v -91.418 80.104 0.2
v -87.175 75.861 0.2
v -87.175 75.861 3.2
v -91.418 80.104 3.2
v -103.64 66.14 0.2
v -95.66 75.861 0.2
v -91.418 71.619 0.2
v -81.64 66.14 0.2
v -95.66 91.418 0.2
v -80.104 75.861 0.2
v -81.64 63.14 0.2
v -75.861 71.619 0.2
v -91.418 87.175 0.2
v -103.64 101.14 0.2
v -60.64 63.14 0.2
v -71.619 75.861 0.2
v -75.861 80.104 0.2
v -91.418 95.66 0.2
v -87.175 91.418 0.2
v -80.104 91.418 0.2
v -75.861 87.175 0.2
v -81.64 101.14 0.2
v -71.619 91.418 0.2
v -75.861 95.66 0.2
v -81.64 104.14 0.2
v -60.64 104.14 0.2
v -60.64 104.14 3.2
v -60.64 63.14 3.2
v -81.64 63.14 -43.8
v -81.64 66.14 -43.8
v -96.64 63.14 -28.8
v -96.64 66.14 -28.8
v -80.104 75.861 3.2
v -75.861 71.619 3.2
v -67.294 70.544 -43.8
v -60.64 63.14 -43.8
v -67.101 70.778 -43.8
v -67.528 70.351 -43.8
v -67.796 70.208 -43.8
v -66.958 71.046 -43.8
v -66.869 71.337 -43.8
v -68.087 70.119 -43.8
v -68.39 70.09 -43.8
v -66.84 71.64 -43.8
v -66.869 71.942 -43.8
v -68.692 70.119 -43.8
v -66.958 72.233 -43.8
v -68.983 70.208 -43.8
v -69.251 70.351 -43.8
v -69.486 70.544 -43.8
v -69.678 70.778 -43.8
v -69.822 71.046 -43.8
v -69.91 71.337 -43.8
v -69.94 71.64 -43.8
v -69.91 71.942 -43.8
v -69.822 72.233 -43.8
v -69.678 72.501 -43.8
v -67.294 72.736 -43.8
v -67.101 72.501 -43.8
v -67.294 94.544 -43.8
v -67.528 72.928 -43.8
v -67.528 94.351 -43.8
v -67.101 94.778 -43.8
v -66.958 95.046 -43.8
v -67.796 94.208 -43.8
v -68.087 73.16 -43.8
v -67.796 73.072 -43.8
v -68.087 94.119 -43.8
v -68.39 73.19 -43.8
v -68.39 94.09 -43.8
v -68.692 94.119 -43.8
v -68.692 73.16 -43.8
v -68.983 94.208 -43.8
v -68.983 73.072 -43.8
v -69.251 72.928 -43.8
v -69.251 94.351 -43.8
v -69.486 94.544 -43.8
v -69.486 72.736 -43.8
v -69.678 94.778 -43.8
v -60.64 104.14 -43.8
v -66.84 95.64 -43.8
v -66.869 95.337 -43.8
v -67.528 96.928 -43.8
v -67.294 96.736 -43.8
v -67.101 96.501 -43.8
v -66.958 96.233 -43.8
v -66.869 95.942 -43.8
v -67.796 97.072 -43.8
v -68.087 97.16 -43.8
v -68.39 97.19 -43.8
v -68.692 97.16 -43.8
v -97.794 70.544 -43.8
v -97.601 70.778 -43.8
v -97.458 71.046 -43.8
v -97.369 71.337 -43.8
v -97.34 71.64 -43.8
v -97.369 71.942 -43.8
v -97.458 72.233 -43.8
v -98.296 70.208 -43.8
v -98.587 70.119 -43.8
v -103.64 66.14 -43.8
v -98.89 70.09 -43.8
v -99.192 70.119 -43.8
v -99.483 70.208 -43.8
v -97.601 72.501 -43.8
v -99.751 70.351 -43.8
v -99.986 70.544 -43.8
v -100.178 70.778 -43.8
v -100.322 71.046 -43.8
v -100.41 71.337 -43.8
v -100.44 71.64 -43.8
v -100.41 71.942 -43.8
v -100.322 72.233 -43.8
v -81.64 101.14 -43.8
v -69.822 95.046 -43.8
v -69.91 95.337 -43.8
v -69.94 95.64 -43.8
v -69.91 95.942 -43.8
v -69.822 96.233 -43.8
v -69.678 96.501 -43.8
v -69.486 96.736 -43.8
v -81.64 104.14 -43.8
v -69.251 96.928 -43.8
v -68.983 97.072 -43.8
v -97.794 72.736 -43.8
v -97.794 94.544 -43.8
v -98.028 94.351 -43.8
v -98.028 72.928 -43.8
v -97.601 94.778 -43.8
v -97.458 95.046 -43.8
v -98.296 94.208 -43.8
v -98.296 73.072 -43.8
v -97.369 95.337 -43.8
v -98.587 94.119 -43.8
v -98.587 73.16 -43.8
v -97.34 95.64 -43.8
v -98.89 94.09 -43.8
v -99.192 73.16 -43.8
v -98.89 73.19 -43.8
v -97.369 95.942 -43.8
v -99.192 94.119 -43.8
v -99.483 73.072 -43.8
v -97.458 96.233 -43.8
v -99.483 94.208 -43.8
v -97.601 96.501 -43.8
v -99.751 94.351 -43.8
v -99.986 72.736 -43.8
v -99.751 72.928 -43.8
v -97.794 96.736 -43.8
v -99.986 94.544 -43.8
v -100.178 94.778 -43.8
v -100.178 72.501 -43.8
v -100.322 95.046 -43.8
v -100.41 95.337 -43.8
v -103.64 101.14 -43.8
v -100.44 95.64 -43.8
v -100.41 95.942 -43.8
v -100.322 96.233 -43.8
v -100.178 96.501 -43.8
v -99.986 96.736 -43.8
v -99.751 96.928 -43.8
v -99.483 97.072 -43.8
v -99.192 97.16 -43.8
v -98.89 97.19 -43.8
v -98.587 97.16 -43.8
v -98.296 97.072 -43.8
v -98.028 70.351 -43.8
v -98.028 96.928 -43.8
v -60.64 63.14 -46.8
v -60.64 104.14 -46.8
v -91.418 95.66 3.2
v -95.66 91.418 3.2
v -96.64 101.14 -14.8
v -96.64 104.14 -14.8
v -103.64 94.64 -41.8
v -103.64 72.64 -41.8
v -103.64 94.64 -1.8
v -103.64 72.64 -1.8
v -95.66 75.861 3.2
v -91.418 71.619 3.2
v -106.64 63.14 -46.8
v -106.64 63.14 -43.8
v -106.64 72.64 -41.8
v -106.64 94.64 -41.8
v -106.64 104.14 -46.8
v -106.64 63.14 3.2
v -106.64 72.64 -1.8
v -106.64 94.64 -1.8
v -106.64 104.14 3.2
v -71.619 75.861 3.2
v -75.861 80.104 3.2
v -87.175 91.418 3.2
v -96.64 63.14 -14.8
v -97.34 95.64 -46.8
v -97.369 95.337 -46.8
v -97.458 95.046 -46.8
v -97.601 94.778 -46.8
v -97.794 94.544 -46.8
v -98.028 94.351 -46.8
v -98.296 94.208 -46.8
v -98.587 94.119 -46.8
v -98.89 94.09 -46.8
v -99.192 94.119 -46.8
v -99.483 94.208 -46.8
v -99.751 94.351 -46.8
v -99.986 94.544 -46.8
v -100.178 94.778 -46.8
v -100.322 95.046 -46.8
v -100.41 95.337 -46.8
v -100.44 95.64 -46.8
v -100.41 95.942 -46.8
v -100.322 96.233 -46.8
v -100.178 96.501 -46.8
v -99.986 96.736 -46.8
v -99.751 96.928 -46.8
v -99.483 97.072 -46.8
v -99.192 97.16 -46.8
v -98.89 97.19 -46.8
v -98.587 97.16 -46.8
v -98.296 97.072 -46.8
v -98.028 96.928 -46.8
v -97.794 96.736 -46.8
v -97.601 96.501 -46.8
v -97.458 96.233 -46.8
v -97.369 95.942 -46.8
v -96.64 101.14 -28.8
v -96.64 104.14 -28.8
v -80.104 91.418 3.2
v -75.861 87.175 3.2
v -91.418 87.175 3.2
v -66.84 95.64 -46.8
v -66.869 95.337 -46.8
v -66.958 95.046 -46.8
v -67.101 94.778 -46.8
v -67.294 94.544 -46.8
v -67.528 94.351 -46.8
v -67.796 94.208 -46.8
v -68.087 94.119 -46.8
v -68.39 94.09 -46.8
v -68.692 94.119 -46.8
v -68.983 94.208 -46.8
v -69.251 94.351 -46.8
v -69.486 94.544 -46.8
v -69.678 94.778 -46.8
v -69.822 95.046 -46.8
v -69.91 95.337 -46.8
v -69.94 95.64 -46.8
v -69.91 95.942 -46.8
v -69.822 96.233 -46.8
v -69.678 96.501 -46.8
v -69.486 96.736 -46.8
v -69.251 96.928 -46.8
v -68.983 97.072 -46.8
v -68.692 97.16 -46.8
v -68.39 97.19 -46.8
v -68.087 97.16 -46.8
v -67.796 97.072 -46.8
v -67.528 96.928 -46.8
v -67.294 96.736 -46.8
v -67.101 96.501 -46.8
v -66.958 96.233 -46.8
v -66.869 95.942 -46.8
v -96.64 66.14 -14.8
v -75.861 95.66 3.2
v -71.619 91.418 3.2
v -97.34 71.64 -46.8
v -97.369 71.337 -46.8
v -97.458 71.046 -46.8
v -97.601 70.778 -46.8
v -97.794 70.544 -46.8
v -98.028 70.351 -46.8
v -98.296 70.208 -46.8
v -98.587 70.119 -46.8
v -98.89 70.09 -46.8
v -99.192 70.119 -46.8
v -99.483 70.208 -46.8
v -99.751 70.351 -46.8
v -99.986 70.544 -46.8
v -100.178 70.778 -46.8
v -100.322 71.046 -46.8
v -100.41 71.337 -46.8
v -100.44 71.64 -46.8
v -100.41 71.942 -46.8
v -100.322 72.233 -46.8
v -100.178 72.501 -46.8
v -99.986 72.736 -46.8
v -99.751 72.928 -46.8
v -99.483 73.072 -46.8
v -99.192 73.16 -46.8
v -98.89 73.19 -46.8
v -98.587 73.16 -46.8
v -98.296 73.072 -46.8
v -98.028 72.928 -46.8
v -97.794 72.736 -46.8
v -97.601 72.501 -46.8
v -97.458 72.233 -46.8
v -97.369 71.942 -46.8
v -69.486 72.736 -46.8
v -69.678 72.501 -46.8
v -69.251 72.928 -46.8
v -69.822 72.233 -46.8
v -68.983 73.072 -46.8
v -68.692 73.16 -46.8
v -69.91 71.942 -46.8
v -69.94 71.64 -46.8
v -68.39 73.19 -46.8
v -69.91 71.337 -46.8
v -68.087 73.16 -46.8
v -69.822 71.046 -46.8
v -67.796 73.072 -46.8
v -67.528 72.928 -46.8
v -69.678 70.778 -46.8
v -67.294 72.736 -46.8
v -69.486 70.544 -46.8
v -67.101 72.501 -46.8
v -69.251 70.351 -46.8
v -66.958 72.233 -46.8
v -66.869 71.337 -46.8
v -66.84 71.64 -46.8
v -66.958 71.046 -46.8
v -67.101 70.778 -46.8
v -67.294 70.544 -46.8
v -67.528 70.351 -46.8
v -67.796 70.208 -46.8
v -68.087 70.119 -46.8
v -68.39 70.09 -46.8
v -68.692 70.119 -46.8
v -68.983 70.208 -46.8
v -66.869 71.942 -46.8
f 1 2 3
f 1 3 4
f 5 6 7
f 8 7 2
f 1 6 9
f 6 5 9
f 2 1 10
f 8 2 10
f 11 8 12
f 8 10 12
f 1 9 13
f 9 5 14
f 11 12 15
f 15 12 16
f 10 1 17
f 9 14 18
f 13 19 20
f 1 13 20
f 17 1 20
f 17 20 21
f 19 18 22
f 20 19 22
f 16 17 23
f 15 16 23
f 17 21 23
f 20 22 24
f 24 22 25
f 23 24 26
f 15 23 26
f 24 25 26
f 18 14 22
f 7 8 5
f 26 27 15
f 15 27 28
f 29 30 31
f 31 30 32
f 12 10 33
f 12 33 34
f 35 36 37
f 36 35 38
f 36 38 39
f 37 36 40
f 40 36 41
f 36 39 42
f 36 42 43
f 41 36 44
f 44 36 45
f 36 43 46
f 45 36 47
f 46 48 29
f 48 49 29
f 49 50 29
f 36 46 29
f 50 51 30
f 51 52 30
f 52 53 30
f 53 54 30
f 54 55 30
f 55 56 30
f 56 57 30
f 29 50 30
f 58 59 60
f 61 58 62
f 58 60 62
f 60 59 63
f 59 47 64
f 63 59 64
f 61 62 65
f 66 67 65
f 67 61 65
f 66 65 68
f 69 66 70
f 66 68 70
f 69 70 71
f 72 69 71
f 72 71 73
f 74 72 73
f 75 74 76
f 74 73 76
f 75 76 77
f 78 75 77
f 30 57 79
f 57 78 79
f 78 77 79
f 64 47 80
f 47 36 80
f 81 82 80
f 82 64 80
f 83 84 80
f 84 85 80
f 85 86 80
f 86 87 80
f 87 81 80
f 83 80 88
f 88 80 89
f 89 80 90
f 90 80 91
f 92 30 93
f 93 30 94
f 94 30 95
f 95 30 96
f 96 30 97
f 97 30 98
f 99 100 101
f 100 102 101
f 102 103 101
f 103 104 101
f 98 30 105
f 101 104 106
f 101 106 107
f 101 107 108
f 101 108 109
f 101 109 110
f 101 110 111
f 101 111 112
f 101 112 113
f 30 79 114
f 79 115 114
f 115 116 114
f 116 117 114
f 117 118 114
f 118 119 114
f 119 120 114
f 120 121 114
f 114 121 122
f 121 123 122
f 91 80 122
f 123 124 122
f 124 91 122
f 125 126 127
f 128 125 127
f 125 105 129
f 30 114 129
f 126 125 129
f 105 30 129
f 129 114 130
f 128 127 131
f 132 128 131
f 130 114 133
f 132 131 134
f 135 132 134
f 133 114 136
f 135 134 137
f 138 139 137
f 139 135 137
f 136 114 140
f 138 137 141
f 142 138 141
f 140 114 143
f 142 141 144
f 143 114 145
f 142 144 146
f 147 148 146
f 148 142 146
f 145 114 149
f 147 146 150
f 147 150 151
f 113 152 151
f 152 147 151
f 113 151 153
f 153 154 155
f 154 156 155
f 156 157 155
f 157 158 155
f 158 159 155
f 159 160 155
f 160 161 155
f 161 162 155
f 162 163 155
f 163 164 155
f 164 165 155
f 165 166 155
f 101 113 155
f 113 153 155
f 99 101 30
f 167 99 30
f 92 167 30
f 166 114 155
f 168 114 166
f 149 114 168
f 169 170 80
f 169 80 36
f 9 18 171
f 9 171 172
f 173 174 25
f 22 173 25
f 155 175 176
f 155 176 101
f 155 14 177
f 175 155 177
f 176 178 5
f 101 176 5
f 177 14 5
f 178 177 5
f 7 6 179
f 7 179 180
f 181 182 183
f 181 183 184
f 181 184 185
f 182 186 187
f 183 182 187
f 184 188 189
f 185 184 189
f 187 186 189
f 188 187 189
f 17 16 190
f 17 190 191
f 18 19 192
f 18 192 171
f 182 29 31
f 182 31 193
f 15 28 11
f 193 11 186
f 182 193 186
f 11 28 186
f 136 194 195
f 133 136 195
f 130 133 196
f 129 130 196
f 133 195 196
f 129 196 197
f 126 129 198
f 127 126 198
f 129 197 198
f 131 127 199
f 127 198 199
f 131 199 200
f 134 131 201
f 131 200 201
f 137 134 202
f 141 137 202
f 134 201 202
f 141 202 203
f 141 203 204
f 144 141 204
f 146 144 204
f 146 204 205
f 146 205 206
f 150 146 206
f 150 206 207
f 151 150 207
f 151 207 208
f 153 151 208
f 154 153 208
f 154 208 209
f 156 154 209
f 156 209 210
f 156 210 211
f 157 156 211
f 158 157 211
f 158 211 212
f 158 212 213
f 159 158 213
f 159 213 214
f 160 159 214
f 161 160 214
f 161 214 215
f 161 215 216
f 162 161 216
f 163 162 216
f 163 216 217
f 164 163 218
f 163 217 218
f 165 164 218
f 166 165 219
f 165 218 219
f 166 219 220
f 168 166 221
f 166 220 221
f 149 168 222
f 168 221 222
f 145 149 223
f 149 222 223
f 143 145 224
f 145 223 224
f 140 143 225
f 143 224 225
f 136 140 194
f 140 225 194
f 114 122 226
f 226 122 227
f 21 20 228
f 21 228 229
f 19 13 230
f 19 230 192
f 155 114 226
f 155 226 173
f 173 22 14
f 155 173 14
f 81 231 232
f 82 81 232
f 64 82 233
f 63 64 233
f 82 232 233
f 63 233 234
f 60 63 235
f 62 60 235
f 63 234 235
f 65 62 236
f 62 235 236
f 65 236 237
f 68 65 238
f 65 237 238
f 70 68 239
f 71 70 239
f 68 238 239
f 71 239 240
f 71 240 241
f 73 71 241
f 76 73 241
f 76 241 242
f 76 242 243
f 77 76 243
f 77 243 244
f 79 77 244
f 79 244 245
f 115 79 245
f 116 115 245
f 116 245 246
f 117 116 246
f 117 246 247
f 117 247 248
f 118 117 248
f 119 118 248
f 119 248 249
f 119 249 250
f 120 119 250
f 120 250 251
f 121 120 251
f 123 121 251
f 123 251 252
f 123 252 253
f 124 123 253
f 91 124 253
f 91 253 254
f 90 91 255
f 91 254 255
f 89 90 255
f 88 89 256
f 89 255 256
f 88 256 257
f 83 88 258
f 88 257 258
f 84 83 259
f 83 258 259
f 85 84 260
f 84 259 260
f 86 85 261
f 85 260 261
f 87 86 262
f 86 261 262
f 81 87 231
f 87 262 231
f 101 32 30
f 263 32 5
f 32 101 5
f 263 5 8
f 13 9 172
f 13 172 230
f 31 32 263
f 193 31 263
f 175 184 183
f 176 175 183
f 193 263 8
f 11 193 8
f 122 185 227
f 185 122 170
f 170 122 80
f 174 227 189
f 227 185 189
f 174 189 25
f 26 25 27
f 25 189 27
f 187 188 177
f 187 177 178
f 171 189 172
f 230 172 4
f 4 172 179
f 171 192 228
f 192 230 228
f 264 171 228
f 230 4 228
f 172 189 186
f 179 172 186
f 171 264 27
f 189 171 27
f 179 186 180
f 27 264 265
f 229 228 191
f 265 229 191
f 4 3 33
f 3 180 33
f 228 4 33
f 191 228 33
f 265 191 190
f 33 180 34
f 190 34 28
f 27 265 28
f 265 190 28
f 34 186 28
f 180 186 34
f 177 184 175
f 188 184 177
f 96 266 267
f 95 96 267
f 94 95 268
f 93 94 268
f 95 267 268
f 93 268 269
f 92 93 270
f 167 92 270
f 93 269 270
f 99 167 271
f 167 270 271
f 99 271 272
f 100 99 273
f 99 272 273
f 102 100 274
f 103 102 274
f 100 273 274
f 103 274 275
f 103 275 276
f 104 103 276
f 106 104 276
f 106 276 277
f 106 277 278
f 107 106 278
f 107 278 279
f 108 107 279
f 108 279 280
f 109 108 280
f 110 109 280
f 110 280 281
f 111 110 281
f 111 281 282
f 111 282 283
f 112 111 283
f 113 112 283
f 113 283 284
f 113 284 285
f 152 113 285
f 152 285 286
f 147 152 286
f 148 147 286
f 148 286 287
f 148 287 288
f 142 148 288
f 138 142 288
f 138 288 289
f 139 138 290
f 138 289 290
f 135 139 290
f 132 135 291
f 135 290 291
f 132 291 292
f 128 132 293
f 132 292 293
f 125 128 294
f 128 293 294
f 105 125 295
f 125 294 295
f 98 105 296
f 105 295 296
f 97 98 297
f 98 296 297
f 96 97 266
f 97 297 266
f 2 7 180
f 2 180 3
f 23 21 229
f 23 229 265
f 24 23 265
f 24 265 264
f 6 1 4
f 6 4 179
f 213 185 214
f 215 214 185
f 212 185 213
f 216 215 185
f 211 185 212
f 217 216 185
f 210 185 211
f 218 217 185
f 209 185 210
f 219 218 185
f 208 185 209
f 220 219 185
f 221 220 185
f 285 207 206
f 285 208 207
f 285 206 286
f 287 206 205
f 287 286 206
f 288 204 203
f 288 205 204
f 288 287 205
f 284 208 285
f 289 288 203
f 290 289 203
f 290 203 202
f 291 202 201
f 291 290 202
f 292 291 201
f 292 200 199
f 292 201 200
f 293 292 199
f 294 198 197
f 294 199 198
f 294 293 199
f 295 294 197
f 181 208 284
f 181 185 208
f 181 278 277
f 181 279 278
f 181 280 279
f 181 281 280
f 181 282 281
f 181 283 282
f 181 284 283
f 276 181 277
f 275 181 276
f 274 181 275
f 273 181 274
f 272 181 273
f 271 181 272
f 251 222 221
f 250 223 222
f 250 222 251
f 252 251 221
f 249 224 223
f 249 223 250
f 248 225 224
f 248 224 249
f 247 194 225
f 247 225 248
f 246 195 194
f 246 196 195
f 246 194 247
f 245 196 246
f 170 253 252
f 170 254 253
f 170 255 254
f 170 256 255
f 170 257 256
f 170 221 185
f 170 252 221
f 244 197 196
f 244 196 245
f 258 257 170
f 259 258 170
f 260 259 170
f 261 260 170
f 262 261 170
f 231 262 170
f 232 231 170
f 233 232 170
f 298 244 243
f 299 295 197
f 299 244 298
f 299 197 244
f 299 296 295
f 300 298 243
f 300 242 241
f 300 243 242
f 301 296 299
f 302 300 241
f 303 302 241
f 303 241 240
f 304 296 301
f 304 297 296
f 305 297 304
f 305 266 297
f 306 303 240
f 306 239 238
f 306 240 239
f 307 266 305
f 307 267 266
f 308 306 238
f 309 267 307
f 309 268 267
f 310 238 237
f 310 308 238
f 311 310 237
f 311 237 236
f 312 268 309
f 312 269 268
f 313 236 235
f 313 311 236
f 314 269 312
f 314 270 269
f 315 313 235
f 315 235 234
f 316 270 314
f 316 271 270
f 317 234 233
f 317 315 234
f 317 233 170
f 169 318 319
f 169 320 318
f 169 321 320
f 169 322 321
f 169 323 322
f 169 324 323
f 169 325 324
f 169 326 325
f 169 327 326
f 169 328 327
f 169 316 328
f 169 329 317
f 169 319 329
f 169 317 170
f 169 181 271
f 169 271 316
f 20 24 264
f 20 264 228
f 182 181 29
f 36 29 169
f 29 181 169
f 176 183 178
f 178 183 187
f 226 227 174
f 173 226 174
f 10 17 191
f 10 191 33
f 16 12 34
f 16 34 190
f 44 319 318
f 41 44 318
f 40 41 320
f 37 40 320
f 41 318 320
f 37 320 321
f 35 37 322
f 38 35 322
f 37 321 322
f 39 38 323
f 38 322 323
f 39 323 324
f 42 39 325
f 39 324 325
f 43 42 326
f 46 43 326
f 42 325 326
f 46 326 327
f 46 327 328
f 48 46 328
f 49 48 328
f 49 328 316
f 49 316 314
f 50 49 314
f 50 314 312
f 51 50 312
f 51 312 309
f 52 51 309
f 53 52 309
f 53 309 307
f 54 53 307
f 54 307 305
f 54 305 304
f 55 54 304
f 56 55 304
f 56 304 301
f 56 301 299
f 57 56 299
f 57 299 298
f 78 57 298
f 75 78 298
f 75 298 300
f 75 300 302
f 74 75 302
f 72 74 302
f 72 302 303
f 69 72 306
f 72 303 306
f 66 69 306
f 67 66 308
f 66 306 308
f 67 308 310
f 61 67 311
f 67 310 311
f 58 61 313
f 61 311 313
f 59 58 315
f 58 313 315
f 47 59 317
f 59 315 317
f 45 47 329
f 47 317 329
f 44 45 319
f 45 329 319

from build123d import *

# Parameters (mm, degrees)
SKETCH033_W     = 46
SKETCH033_H     = 41
PAD022_DEPTH    = 3
POCKET011_DEPTH = 5
PAD023_DEPTH    = 47
SKETCH036_W     = 46
SKETCH036_H     = 41
PAD024_DEPTH    = 3
SKETCH037_R     = 1.55
POCKET012_DEPTH = 5
POCKET013_DEPTH = 41.001
SKETCH039_W     = 22
SKETCH039_H     = 40
POCKET014_DEPTH = 5


with BuildPart() as part:
    # Sketch033 (on Face1 of Binder006) → Pad022 (new body)
    with BuildSketch(Plane(origin=(0, 0, 3.2), x_dir=(1, 0, 0), z_dir=(0, 0, -1))):
        with Locations((-83.6396103068, -83.6396103068)):
            Rectangle(SKETCH033_W, SKETCH033_H)
    extrude(amount=PAD022_DEPTH)

    # Sketch034 → Pocket011 (cut)
    with BuildSketch(Plane.XY):
        Polygon((-91.4177848998, 95.660425587), (-95.660425587, 91.4177848998), (-91.4177848998, 87.1751442127), (-87.1751442127, 91.4177848998), align=None)
        Polygon((-75.8614357137, 95.660425587), (-80.1040764009, 91.4177848998), (-75.8614357137, 87.1751442127), (-71.6187950266, 91.4177848998), align=None)
        Polygon((-91.4177848998, 80.1040764009), (-95.660425587, 75.8614357137), (-91.4177848998, 71.6187950266), (-87.1751442127, 75.8614357137), align=None)
        Polygon((-80.1040764009, 75.8614357137), (-75.8614357137, 71.6187950266), (-71.6187950266, 75.8614357137), (-75.8614357137, 80.1040764009), align=None)
    extrude(amount=POCKET011_DEPTH, mode=Mode.SUBTRACT)

    # Sketch035 (on Face5 of Pocket011) → Pad023 (join)
    with BuildSketch(Plane(origin=(0, 0, 0.2), x_dir=(1, 0, 0), z_dir=(0, 0, -1))):
        Polygon((-60.6396103068, -63.1396103068), (-106.6396103068, -63.1396103068), (-106.6396103068, -104.1396103068), (-60.6396103068, -104.1396103068), (-60.6396103068, -101.1396103068), (-103.6396103068, -101.1396103068), (-103.6396103068, -66.1396103068), (-60.6396103068, -66.1396103068), align=None)
    extrude(amount=PAD023_DEPTH)

    # Sketch036 (on Face20 of Pad023) → Pad024 (join)
    with BuildSketch(Plane(origin=(0, 0, -46.8), x_dir=(1, 0, 0), z_dir=(0, 0, -1))):
        with Locations((-83.63961, -83.63961)):
            Rectangle(SKETCH036_W, SKETCH036_H)
    extrude(amount=-PAD024_DEPTH)

    # Sketch037 (on Face27 of Pad024) → Pocket012 (cut)
    with BuildSketch(Plane(origin=(0, 0, -46.8), x_dir=(1, 0, 0), z_dir=(0, 0, -1))):
        with Locations((-98.8896103068, -71.6396103068)):
            Circle(SKETCH037_R)
        with Locations((-68.3896103068, -71.6396103068)):
            Circle(SKETCH037_R)
        with Locations((-98.8896103068, -95.6396103068)):
            Circle(SKETCH037_R)
        with Locations((-68.3896103068, -95.6396103068)):
            Circle(SKETCH037_R)
    extrude(amount=-POCKET012_DEPTH, mode=Mode.SUBTRACT)

    # Sketch038 (on Face27 of Pocket012) → Pocket013 (cut, through all)
    with BuildSketch(Plane(origin=(0, 104.1396103068, 0), x_dir=(-1, 0, 0), z_dir=(0, 1, 0))):
        Polygon((81.6396103068, 0.2), (59.6396103068, 0.2), (59.6396103068, -43.8), (81.6396103068, -43.8), (96.6396103068, -28.8), (96.6396103068, -14.8), align=None)
    extrude(amount=-POCKET013_DEPTH, mode=Mode.SUBTRACT)

    # Sketch039 (on Face30 of Pocket013) → Pocket014 (cut)
    with BuildSketch(Plane(origin=(-106.6396103068, 0, 0), x_dir=(0, -1, 0), z_dir=(-1, 0, 0))):
        with Locations((-83.6396103068, -21.8)):
            Rectangle(SKETCH039_W, SKETCH039_H)
    extrude(amount=-POCKET014_DEPTH, mode=Mode.SUBTRACT)


solid = part.part
